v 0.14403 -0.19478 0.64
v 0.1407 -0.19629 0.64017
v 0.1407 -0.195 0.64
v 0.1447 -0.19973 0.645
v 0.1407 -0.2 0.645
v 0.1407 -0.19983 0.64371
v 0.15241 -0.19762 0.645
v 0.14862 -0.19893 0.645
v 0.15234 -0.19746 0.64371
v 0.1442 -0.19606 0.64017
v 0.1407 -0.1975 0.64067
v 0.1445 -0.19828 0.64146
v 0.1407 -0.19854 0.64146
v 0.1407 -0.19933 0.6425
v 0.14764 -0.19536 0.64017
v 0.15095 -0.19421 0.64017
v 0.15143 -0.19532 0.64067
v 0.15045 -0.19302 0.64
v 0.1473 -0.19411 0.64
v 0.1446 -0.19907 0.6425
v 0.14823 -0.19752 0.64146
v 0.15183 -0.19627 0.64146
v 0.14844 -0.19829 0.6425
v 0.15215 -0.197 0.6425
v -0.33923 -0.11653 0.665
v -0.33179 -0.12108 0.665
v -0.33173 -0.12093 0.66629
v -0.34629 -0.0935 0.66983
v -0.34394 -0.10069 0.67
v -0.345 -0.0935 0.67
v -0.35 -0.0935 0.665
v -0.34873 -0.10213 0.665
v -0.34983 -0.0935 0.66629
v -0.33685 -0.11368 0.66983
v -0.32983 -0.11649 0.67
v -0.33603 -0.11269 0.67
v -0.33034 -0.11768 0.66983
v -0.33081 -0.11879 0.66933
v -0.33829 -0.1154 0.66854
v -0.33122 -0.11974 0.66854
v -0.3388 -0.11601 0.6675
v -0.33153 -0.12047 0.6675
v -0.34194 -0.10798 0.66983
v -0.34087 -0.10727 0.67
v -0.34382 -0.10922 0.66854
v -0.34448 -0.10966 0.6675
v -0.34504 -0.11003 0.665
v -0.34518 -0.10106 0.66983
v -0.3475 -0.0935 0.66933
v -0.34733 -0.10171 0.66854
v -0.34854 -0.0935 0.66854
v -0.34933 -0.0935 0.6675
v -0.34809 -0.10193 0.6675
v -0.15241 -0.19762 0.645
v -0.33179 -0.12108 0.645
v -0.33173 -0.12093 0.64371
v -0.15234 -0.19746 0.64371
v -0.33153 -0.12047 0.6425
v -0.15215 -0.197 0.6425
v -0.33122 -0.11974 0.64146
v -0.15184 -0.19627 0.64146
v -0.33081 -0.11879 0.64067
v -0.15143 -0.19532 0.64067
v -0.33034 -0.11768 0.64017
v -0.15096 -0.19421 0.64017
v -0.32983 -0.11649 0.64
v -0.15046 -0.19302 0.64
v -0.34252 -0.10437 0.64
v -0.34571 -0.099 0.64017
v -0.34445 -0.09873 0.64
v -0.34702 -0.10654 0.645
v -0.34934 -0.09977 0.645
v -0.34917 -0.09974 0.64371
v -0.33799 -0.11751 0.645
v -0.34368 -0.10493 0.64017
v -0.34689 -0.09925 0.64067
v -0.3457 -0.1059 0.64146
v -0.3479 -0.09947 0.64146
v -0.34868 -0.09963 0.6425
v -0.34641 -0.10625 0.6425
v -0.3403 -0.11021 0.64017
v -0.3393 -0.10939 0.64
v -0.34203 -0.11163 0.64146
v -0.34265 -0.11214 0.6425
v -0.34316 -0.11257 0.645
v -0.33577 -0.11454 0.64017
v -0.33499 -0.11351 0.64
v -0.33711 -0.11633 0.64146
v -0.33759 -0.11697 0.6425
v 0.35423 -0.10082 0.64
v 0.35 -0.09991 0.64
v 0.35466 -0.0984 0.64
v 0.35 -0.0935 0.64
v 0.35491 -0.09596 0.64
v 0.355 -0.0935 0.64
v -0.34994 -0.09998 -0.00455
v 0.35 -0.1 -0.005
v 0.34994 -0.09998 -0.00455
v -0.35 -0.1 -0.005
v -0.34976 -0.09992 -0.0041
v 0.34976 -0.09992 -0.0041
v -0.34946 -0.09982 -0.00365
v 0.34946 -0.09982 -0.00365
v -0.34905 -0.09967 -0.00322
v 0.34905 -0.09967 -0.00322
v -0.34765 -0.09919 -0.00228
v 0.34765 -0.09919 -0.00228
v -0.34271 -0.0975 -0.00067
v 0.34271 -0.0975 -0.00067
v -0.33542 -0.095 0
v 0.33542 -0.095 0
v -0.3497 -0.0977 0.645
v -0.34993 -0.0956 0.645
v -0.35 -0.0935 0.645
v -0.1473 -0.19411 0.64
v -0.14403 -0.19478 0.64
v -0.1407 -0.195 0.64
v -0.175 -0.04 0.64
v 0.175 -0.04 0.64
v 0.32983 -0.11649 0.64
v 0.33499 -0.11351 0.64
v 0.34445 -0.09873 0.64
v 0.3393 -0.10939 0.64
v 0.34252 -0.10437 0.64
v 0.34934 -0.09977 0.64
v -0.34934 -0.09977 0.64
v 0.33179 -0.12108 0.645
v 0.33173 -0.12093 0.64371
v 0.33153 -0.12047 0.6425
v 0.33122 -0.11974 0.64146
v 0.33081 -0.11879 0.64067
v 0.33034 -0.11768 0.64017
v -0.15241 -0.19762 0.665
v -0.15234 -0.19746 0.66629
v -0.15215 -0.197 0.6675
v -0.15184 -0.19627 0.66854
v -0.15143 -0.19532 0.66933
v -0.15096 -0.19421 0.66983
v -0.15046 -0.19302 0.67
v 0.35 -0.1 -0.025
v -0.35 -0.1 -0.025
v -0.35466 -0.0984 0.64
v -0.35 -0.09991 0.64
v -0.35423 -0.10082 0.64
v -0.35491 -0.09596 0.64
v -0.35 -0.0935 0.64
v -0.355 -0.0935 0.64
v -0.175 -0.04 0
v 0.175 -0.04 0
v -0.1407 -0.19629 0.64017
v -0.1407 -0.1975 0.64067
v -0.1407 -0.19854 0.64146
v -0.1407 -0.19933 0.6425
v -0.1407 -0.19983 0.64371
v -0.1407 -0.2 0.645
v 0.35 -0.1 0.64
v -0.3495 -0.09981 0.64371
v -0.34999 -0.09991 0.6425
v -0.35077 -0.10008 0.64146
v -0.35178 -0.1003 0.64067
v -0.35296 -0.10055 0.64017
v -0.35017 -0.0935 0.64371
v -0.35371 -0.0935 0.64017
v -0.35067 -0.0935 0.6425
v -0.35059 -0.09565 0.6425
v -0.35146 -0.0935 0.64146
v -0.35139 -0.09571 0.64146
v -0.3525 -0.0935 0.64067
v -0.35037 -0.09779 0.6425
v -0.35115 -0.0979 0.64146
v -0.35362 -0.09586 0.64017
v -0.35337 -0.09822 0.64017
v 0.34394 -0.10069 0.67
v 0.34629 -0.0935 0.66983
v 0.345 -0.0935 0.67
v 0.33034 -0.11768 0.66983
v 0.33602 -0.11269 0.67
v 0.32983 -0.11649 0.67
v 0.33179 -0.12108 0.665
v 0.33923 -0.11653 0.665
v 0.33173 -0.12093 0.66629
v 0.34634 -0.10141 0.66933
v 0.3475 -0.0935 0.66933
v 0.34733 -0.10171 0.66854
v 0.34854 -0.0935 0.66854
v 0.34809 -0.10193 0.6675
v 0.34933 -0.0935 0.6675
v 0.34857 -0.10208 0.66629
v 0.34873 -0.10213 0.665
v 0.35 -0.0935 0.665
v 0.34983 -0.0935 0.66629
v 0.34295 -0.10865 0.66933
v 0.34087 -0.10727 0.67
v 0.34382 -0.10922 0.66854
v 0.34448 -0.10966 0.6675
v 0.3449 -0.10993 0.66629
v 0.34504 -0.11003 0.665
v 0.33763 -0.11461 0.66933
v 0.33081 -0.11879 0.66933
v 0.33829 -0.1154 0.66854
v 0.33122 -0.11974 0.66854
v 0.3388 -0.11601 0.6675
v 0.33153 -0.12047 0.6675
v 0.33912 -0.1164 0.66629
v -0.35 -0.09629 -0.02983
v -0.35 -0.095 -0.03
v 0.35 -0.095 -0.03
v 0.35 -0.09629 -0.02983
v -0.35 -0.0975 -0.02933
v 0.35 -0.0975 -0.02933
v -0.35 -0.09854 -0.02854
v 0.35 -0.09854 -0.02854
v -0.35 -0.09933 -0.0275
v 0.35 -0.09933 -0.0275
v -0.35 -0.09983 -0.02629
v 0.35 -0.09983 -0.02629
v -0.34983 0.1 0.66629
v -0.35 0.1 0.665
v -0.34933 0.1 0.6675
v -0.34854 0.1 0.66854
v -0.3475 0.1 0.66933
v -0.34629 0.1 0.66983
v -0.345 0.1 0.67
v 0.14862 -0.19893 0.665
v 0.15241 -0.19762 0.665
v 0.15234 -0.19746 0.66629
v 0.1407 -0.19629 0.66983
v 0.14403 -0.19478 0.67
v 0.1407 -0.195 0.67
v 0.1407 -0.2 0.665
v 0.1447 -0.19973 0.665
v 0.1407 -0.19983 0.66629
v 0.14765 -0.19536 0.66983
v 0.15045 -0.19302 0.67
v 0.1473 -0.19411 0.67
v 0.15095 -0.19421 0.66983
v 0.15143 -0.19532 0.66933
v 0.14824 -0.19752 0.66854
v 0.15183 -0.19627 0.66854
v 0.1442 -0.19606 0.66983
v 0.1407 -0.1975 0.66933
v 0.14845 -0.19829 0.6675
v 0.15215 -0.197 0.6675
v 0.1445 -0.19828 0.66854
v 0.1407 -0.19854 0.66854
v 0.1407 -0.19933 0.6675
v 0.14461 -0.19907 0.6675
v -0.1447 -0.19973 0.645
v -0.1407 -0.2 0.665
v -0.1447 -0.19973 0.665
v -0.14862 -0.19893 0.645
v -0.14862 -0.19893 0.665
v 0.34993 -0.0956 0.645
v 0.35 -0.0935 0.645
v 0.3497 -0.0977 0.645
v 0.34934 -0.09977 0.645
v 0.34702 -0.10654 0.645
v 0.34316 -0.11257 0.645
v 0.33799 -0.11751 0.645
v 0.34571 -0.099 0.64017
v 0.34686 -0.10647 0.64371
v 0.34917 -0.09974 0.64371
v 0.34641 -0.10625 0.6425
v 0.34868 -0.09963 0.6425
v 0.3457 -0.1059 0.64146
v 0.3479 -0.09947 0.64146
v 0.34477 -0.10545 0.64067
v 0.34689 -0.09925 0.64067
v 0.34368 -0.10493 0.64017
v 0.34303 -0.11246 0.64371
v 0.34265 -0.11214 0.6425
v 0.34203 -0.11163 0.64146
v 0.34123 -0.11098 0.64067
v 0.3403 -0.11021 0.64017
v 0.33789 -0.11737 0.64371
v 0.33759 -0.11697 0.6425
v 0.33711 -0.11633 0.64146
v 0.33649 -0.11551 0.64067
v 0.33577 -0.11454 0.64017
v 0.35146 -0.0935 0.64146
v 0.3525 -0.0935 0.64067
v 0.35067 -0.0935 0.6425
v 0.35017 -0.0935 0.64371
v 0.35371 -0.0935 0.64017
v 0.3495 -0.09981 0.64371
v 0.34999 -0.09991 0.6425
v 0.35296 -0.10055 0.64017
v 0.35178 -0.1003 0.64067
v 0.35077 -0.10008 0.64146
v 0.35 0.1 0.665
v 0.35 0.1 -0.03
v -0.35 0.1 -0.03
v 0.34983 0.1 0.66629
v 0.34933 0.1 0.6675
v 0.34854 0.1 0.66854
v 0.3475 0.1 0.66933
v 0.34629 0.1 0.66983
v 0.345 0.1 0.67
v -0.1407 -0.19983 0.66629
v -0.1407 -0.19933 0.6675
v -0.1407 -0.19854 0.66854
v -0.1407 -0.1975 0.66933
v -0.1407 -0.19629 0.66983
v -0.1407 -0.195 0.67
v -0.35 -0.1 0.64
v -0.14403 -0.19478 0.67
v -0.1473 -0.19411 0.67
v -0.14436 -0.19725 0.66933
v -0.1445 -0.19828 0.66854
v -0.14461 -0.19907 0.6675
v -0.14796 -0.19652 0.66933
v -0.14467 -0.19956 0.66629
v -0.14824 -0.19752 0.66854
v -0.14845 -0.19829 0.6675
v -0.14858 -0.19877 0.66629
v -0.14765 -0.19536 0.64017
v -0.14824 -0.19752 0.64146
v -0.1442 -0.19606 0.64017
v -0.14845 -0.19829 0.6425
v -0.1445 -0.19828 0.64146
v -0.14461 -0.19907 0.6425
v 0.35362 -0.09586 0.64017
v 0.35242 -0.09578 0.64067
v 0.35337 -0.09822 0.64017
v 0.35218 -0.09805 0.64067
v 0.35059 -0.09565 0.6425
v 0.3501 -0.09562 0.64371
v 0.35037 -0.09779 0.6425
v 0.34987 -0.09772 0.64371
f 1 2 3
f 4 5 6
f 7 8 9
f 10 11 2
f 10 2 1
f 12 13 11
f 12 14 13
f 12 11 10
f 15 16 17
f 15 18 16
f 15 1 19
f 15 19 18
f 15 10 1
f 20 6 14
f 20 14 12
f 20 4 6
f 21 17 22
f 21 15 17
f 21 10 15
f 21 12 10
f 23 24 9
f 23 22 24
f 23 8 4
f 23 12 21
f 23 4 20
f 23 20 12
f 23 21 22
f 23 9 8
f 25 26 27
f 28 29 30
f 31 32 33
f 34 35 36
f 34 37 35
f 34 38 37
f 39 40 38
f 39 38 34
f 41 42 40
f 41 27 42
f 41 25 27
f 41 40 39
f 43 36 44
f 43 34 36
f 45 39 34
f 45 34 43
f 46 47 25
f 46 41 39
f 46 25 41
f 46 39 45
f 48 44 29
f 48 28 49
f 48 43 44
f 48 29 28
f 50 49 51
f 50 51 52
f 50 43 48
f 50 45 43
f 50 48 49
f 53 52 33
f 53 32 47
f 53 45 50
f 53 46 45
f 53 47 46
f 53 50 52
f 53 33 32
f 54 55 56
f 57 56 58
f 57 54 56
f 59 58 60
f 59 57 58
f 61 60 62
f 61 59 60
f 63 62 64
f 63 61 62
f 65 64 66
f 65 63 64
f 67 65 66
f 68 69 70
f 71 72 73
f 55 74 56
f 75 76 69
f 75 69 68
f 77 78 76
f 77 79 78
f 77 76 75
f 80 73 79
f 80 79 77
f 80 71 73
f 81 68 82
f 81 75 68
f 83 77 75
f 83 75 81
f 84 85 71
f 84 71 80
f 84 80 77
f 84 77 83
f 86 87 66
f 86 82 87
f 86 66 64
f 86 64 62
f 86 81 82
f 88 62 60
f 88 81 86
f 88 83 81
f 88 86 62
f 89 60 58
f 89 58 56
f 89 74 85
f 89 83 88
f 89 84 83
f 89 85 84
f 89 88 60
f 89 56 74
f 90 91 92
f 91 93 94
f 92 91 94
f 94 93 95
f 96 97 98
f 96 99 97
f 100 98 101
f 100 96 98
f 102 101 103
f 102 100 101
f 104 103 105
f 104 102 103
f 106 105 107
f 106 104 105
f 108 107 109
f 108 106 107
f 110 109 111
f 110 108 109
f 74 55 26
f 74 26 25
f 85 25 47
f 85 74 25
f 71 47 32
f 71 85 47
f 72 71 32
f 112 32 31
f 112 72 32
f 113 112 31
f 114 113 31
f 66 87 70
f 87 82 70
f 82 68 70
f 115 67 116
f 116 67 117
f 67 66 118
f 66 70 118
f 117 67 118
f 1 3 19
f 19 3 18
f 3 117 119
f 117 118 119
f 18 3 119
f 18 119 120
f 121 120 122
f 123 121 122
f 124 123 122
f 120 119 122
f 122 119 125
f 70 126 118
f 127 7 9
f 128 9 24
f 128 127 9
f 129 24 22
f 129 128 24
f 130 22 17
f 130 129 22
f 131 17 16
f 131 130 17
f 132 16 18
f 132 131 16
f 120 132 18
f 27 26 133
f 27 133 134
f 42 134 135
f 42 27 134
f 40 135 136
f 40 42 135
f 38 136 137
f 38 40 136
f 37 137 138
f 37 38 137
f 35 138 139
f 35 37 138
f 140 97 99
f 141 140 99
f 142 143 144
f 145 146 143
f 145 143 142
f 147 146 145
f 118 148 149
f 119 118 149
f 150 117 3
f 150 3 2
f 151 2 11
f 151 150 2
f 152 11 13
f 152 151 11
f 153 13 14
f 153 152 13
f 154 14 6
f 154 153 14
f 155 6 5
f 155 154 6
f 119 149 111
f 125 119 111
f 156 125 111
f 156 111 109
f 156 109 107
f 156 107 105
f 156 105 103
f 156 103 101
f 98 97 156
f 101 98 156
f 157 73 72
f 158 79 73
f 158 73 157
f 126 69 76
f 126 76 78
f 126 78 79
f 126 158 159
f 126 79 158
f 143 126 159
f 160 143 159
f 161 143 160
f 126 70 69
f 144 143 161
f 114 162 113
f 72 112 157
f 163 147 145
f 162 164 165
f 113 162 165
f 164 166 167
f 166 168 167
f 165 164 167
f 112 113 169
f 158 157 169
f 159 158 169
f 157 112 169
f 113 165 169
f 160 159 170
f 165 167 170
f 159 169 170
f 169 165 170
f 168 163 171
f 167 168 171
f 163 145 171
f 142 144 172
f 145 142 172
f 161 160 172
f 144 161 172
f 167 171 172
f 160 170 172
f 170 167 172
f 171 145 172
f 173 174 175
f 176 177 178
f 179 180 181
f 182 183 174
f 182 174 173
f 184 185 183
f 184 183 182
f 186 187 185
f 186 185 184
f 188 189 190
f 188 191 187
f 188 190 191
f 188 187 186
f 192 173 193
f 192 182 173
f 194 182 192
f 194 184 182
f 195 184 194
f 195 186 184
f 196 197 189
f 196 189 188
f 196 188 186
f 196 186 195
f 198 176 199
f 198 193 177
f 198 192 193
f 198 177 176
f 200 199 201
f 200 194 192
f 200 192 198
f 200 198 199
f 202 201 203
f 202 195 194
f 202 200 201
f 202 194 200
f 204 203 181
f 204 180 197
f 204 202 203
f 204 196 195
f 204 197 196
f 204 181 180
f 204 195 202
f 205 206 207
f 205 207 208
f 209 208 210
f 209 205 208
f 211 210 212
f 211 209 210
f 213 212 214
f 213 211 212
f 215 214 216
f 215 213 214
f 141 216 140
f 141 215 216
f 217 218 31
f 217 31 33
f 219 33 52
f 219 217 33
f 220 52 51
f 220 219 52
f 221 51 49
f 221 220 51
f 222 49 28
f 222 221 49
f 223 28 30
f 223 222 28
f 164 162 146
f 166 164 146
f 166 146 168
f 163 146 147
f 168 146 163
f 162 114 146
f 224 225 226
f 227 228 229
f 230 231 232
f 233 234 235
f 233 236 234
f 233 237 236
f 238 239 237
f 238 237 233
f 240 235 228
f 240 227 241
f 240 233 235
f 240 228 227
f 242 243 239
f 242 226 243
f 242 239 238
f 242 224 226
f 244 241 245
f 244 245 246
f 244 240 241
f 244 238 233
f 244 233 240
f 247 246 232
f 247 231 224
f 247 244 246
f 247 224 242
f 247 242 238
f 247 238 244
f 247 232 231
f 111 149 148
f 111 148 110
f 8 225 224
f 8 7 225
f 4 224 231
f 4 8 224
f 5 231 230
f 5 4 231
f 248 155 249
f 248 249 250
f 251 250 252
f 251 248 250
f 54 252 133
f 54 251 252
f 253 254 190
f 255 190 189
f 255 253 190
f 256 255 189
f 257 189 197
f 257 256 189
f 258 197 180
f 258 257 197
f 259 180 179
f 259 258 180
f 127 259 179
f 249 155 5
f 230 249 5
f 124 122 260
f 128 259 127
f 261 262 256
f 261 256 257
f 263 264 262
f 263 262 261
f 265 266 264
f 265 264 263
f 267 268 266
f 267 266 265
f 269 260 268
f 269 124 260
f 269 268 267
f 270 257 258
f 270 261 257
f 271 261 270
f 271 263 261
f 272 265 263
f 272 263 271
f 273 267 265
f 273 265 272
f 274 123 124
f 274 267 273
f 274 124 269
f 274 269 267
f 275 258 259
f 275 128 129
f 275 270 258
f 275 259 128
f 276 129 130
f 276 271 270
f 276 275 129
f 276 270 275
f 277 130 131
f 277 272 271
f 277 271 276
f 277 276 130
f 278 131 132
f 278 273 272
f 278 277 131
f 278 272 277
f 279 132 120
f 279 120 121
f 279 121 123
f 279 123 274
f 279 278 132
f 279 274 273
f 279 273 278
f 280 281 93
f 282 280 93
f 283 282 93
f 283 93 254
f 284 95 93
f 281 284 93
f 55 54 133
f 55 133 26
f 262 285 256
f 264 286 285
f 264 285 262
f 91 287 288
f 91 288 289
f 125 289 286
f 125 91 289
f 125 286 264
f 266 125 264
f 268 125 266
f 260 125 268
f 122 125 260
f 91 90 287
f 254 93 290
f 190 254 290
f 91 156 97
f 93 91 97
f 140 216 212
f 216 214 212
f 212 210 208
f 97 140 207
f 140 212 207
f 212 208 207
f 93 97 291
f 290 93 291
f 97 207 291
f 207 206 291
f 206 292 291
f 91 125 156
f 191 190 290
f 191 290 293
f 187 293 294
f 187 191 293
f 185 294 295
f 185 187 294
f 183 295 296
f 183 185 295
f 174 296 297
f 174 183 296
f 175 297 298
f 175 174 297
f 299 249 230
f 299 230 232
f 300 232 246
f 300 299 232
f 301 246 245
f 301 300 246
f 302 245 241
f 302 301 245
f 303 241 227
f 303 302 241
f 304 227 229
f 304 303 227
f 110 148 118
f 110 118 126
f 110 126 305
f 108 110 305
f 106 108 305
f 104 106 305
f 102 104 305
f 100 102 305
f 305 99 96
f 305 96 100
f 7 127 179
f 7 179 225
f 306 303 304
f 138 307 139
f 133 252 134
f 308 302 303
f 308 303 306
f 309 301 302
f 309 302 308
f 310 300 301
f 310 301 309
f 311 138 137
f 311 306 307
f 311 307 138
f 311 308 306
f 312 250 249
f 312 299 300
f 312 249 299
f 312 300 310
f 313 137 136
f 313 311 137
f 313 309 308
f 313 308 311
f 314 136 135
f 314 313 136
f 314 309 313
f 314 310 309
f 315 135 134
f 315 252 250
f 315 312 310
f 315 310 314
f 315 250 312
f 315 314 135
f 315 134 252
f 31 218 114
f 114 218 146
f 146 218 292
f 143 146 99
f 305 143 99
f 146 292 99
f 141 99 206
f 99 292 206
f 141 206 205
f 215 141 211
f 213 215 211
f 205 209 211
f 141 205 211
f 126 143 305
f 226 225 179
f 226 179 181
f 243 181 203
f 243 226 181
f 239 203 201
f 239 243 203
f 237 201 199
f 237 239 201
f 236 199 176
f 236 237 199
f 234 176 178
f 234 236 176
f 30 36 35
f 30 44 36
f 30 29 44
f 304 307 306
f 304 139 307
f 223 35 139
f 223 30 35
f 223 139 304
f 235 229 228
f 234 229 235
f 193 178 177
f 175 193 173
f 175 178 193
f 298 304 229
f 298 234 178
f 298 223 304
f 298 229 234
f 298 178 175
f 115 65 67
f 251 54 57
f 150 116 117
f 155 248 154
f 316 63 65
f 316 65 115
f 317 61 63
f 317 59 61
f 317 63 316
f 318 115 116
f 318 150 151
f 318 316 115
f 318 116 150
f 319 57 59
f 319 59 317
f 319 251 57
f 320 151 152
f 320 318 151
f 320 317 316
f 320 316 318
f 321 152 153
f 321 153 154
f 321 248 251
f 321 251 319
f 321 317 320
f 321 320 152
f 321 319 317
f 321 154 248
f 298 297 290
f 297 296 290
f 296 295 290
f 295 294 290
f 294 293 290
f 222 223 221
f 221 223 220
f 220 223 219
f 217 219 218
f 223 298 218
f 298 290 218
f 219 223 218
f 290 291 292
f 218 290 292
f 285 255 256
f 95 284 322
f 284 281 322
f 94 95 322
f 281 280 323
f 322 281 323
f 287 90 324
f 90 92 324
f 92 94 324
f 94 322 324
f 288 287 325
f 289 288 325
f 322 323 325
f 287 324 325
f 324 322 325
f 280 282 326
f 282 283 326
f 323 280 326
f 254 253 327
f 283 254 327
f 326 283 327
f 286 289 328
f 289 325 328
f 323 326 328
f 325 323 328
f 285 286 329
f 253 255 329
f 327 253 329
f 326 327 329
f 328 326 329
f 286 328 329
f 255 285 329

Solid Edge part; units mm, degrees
sketch "Sketch1" plane through (0, 0, 0) normal (0, 0, 1) x (1, 0, 0)
  line L0 (0.35, -0.1) -> (0.35, 0.1)
  line L1 (0.35, 0.1) -> (-0.35, 0.1)
  line L2 (-0.35, 0.1) -> (-0.35, -0.1)
  line L3 (-0.175, -0.04) -> (-0.35, -0.1)
  line L4 (-0.175, -0.04) -> (0.175, -0.04)
  line L5 (0.175, -0.04) -> (0.35, -0.1)
  dimension "D1" = 0.7
  dimension "D2" = 0.2
  dimension "D3" = 0.35
  dimension "D4" = 0.06
extrude "Protrusion1" add sketch "Sketch1" along normal blind 0.64
extrude "Cutout1" [suppressed]
shell "Dünnwand_1" [suppressed]
extrude "Cutout2" [suppressed]
sketch "Sketch2" plane through (0, 0, 0.64) normal (0, 0, 1) x (0, 1, 0)
  line L0 (0.1, 0.35) -> (-0.0935, 0.35)
  arc A0 (-0.1211, 0.3318) -> (-0.0935, 0.35) centre (-0.0935, 0.32) cw
  line L1 (-0.1976, 0.1524) -> (-0.1211, 0.3318)
  arc A1 (-0.1976, 0.1524) -> (-0.2, 0.1407) centre (-0.17, 0.1407) ccw
  line L2 (-0.2, 0.1407) -> (-0.2, -0.1407)
  arc A2 (-0.2, -0.1407) -> (-0.1976, -0.1524) centre (-0.17, -0.1407) ccw
  line L3 (-0.1211, -0.3318) -> (-0.1976, -0.1524)
  arc A3 (-0.1211, -0.3318) -> (-0.0935, -0.35) centre (-0.0935, -0.32) ccw
  line L4 (-0.0935, -0.35) -> (0.1, -0.35)
  line L5 (0.1, -0.35) -> (0.1, 0.35)
  dimension "D1" = 0.2
extrude "Ausprägung_2" add sketch "Sketch2" along normal blind 0.03
sketch "Sketch3" plane through (0, 0, 0) normal (0, 0, -1) x (0, 1, 0)
  line L0 (0.1, 0.35) -> (0.1, -0.35)
  line L1 (0.1, -0.35) -> (-0.1, -0.35)
  line L2 (-0.1, 0.35) -> (-0.1, -0.35)
  line L3 (-0.1, 0.35) -> (0.1, 0.35)
  dimension "D1" = 0.2
extrude "Ausprägung_3" add sketch "Sketch3" along normal blind 0.03
fillet "Verrundung_1" radius 0.005 20 edges at (0, -0.1, 0) (0, -0.1, -0.03) (0.2421, -0.1593, 0.64) (0.3431, -0.1126, 0.64) (0.3498, -0.0966, 0.64) (0.1467, -0.1994, 0.64) (0, -0.2, 0.64) (-0.1467, -0.1994, 0.64) (-0.2421, -0.1593, 0.64) (-0.3431, -0.1126, 0.64) (-0.3498, -0.0966, 0.64) (0.2421, -0.1593, 0.67) (0.345, -0.11, 0.67) (0.35, 0.0033, 0.67) (0.1467, -0.1994, 0.67) (0, -0.2, 0.67) (-0.1467, -0.1994, 0.67) (-0.2421, -0.1593, 0.67) (-0.345, -0.11, 0.67) (-0.35, 0.0033, 0.67)
